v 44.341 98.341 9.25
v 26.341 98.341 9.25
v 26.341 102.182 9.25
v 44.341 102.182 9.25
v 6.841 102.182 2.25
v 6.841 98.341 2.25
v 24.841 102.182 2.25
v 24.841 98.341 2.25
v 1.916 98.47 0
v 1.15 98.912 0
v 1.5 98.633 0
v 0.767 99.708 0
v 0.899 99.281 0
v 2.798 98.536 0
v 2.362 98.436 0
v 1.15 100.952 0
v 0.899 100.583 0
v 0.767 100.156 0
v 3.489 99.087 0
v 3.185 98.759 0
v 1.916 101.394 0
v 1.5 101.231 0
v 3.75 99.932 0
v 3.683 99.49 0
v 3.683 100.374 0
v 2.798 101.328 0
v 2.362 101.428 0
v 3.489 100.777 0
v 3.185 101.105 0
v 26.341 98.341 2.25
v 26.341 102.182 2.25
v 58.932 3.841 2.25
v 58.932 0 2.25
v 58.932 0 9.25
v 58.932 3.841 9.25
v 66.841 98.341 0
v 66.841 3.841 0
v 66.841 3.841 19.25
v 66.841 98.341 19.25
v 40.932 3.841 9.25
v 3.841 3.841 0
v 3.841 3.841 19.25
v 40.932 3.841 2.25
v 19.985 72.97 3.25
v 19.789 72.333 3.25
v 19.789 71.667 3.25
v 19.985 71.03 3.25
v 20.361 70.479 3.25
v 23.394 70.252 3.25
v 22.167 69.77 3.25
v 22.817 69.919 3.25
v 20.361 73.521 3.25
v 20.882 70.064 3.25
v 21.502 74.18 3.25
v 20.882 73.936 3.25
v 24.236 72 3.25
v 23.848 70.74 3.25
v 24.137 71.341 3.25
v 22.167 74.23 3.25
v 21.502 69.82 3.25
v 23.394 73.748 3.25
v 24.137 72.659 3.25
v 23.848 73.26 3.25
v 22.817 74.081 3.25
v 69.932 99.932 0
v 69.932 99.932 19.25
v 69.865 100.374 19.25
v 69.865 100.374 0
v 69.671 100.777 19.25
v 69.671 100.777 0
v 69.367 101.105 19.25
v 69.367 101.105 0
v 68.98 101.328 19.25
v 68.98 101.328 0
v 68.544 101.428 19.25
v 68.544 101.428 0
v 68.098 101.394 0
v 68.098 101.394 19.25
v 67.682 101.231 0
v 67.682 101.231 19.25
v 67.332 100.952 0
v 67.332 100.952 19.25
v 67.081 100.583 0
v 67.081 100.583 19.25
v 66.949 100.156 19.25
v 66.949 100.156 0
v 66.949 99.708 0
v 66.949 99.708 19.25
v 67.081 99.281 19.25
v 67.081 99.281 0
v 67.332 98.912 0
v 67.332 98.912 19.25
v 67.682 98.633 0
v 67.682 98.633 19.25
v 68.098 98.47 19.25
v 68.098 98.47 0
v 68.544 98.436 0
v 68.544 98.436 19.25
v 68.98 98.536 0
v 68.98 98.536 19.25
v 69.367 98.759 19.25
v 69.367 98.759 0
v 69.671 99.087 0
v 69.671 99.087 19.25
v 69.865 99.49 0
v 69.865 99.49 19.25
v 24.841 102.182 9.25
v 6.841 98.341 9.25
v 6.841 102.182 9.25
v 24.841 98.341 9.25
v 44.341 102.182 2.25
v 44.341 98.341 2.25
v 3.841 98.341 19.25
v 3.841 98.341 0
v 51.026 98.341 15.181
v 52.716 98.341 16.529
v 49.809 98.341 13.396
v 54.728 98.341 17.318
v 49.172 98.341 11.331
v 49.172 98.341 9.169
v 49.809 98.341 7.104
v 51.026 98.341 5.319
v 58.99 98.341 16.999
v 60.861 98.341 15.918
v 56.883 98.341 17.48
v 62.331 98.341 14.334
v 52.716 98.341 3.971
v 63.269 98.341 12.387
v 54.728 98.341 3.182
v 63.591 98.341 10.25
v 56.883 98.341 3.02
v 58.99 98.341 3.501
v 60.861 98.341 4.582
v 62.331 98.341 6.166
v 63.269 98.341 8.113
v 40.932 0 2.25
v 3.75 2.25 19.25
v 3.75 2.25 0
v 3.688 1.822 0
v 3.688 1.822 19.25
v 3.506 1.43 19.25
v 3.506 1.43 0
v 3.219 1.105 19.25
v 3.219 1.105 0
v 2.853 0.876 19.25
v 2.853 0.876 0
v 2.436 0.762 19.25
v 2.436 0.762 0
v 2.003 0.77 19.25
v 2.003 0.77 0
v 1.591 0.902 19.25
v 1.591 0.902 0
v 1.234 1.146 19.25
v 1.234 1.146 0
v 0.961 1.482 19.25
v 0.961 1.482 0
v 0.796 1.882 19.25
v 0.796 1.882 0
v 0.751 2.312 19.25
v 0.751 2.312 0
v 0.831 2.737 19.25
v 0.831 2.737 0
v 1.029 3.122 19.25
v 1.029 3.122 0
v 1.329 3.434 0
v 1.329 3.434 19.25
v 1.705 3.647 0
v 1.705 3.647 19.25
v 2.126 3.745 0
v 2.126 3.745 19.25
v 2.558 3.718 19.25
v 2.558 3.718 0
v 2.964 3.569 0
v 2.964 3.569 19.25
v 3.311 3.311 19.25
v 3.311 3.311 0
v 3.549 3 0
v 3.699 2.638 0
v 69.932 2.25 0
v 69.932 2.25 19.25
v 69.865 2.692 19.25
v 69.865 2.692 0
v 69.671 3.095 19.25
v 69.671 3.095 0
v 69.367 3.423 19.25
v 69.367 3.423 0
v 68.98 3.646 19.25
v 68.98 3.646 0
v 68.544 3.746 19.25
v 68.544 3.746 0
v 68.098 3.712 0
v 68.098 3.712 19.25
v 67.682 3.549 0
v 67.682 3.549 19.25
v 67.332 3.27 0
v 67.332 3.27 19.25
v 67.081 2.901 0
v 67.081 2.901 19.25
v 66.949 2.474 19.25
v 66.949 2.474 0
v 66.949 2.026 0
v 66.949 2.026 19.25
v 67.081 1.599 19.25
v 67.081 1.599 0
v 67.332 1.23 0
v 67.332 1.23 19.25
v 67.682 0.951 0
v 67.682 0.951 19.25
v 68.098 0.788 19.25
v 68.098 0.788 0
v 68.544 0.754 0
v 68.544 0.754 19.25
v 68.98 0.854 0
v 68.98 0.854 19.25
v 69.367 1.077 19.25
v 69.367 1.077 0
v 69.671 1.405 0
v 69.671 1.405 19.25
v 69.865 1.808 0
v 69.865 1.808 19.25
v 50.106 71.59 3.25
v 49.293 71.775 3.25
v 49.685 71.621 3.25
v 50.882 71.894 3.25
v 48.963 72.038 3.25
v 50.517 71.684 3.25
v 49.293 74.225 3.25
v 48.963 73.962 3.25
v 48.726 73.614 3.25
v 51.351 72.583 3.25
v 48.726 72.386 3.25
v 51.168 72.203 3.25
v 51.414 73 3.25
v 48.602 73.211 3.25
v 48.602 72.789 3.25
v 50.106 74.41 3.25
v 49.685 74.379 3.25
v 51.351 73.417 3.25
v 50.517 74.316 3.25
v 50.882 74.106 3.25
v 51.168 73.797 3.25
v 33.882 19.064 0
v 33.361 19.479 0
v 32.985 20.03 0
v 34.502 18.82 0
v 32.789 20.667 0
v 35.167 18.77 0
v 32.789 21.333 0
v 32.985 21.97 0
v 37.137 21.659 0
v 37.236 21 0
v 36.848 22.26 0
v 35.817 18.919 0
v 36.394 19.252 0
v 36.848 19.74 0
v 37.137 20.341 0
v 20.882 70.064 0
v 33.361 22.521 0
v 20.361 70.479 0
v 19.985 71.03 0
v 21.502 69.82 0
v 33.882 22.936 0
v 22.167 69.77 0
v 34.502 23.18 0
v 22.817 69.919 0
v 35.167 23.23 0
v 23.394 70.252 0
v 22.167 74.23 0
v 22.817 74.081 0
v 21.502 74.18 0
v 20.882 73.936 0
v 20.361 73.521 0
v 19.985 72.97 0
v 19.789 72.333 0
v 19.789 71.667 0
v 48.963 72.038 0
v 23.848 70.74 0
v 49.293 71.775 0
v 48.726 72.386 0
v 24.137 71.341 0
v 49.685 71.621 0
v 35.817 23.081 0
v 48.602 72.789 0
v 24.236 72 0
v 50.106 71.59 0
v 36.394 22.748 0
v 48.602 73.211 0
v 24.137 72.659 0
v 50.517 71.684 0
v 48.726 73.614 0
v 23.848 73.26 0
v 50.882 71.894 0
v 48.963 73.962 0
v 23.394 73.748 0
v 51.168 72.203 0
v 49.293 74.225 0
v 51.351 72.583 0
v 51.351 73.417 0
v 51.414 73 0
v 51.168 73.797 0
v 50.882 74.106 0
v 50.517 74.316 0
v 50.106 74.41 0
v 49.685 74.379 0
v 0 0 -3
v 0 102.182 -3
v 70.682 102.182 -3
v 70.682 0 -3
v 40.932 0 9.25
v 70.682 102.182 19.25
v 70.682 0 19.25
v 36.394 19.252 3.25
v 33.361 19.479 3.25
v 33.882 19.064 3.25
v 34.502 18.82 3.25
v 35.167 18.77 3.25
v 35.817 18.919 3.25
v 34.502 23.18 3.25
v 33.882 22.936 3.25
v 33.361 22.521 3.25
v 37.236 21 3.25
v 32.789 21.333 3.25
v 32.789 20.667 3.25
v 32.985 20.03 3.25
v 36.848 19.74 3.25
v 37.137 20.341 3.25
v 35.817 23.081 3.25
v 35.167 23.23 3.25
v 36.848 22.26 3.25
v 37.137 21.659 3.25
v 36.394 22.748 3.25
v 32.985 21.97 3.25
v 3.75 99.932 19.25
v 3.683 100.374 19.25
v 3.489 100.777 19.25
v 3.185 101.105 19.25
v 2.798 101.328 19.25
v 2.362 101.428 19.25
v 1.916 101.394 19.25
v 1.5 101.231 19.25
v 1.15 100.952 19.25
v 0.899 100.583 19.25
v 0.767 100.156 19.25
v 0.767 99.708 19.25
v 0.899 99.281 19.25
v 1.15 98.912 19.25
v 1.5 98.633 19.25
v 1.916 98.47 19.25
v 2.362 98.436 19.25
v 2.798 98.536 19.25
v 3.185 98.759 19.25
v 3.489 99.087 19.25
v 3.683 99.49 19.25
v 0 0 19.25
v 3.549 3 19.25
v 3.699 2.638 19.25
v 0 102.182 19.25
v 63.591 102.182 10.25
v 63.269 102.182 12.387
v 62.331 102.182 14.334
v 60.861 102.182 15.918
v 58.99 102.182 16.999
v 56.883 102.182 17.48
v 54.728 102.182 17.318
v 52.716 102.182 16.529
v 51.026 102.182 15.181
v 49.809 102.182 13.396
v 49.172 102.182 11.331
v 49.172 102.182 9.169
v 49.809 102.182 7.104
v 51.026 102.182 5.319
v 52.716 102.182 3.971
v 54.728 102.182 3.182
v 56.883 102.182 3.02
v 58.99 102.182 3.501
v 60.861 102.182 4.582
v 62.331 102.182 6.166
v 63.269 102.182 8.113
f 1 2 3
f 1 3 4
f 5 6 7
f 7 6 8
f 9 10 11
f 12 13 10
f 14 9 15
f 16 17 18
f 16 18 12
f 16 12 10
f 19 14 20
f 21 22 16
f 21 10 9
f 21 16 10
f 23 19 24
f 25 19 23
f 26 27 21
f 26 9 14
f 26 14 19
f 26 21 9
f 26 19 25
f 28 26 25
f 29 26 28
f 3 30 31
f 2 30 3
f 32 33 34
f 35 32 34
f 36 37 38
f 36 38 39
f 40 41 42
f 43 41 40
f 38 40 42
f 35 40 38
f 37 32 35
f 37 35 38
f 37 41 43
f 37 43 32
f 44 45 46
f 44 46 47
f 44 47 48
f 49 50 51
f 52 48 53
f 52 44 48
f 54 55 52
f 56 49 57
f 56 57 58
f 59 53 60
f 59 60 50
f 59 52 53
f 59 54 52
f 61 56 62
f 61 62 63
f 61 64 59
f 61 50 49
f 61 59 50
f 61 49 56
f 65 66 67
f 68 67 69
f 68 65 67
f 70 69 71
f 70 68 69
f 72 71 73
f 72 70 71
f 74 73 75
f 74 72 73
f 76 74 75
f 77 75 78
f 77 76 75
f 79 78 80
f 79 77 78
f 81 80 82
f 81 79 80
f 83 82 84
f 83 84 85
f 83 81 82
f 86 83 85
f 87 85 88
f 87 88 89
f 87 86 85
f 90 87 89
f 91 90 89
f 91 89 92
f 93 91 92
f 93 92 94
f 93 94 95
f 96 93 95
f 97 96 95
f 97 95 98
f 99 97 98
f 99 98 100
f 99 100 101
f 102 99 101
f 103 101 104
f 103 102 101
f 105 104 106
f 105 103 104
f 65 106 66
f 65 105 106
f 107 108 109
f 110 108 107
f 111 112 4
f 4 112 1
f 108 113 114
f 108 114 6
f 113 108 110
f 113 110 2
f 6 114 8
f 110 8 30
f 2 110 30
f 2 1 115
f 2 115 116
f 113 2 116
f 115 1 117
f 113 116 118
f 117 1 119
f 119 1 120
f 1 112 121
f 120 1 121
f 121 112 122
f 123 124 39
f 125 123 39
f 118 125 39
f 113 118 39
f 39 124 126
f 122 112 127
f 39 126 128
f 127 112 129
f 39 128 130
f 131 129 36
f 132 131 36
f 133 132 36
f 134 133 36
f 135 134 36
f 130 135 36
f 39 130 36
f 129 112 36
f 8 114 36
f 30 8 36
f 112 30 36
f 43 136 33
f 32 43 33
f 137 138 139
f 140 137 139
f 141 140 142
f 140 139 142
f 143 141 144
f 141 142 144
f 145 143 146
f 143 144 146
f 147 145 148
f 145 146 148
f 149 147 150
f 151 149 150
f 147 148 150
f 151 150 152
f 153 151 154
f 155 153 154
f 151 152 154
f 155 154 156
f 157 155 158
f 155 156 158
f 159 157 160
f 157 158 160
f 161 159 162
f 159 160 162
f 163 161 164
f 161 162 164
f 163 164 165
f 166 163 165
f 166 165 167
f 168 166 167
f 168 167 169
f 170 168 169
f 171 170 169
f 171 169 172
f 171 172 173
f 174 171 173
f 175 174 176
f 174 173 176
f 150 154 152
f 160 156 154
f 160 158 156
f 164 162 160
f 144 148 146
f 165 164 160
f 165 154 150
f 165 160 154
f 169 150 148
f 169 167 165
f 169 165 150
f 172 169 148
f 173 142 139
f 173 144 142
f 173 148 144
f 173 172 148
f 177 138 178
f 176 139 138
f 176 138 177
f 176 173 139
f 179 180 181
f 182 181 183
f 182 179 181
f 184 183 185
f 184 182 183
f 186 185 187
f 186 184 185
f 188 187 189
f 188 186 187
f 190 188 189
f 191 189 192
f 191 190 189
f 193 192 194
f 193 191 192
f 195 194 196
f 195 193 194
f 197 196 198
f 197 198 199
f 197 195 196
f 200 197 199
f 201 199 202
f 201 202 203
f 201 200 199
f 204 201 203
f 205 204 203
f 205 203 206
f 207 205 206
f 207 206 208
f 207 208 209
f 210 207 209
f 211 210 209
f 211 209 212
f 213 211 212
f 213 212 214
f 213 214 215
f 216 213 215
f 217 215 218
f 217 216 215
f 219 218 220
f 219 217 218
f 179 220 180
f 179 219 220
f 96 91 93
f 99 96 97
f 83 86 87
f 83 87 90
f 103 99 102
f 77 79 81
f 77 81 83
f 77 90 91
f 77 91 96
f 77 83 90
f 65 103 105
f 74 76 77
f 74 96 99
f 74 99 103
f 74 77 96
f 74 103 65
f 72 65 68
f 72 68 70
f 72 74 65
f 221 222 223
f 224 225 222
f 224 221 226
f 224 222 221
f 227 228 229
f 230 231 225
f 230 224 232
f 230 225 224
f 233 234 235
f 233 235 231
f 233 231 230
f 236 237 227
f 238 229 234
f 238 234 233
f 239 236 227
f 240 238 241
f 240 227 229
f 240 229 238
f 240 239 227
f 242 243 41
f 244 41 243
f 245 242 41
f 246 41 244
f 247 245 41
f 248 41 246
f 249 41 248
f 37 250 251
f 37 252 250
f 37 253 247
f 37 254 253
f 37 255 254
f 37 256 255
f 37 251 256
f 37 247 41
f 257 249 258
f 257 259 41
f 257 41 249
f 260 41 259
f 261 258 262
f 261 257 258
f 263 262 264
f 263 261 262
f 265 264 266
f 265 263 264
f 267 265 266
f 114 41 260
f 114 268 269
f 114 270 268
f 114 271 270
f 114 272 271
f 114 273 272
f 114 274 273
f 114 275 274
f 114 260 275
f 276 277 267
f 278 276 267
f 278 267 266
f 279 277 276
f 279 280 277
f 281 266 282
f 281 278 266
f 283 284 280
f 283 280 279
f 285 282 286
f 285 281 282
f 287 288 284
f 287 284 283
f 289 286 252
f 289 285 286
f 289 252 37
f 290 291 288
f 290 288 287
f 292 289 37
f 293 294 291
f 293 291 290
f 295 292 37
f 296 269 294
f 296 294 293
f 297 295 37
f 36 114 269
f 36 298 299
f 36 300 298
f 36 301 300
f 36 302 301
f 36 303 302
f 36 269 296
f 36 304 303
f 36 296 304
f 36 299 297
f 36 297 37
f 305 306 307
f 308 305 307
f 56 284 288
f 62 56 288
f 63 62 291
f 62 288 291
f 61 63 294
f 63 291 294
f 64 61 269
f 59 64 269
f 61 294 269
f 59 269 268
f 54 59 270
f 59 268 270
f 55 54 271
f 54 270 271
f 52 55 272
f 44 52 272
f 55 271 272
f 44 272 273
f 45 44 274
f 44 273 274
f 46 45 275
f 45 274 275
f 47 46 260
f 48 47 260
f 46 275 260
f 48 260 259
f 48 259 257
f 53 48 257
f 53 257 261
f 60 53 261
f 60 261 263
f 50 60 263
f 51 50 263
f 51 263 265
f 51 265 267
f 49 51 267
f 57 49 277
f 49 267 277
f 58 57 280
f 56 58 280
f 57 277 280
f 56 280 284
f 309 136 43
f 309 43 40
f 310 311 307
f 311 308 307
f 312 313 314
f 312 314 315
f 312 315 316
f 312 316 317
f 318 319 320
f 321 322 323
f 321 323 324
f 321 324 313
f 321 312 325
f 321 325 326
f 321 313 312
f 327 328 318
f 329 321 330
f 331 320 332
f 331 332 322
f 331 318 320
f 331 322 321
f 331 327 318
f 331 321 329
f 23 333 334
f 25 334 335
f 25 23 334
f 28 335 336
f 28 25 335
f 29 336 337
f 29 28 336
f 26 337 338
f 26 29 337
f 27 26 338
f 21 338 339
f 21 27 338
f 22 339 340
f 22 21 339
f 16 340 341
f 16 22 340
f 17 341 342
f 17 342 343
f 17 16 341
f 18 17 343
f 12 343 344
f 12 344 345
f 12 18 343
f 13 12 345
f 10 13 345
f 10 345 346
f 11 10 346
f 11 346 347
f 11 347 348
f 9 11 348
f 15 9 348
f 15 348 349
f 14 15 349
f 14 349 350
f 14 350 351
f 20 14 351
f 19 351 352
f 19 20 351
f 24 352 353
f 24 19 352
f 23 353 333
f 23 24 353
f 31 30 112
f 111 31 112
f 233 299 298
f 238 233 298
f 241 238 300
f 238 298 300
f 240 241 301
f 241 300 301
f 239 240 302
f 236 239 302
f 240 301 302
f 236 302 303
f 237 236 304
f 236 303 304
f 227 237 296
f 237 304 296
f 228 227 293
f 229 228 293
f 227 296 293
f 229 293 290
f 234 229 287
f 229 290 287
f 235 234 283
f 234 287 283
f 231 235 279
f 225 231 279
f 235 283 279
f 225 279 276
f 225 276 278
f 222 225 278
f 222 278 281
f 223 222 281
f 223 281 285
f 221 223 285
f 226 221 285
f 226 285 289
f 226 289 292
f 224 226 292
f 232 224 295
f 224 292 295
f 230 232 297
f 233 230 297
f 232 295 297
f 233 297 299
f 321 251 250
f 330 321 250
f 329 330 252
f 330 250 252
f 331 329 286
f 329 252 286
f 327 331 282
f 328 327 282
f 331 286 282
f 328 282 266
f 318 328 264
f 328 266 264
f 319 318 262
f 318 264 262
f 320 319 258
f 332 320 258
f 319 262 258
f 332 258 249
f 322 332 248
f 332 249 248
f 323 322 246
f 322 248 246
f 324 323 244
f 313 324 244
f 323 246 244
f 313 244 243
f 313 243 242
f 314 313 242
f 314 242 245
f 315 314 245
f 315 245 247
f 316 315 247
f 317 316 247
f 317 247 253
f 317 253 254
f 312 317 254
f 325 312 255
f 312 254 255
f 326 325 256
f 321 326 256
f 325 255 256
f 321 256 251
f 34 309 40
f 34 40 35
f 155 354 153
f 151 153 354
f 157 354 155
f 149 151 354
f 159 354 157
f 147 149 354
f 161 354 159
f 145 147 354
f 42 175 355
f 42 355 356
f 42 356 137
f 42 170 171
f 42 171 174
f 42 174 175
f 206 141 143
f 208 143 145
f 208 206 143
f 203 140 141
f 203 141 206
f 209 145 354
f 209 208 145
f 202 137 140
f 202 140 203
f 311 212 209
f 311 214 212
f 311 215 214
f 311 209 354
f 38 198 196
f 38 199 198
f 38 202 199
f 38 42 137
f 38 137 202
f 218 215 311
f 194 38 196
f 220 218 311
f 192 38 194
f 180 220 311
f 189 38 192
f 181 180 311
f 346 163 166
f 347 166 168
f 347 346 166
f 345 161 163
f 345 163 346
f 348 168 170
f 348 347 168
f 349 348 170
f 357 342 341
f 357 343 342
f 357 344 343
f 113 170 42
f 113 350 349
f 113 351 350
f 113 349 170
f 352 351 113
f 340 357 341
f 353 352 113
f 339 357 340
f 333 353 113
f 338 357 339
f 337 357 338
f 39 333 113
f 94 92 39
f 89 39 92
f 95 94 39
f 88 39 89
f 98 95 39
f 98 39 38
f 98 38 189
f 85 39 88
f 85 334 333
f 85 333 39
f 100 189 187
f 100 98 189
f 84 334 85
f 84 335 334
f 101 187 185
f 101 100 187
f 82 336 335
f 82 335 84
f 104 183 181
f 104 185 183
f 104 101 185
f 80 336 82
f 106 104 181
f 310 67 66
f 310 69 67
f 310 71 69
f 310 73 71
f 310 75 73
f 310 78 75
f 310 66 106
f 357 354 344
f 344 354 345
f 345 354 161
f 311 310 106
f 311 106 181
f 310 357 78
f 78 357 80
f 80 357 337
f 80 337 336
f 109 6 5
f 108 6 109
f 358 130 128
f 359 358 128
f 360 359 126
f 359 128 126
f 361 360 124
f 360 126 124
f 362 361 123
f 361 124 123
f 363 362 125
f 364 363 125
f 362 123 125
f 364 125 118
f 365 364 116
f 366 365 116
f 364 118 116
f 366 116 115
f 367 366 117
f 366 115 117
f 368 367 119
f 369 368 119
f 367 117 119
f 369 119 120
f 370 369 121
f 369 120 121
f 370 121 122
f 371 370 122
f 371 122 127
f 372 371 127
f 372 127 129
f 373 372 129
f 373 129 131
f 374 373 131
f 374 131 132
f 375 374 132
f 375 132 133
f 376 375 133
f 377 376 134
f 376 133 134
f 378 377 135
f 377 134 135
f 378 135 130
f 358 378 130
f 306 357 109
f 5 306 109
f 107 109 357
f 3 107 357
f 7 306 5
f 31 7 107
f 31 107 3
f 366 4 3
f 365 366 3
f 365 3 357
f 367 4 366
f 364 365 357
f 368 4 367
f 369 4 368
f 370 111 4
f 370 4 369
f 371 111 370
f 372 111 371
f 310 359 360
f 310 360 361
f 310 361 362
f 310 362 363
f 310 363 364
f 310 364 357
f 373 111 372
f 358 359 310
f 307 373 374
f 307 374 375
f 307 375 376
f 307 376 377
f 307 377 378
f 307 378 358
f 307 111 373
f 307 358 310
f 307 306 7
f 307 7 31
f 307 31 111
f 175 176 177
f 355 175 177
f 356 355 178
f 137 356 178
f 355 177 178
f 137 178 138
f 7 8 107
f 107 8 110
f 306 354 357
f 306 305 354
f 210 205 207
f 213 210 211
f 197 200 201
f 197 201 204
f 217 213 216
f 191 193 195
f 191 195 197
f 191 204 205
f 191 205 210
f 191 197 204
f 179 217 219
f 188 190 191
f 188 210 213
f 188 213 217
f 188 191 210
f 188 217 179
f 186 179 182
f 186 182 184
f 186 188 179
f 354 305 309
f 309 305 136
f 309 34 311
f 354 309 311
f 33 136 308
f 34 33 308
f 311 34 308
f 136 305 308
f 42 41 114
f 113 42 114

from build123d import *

# Parameters (mm, degrees)
SKETCH1_R             = 2.236067977
BOSS_EXTRUDE1_DEPTH   = 3.25
SKETCH1_R_2           = 1.414213562
BOSS_EXTRUDE1_2_DEPTH = 3.25
BOSS_EXTRUDE1_3_DEPTH = 3.25
SKETCH1_21_W          = 70.681980515
SKETCH1_21_H          = 102.181980515
BOSS_EXTRUDE2_DEPTH   = 3
SKETCH1_23_W          = 70.681980515
SKETCH1_23_H          = 102.181980515
SKETCH1_23_R          = 1.5
SKETCH1_23_W_2        = 63
SKETCH1_23_H_2        = 94.5
BOSS_EXTRUDE4_DEPTH   = 19.25
SKETCH3_R             = 7.25
SKETCH3_W             = 18
SKETCH3_H             = 7
CUT_EXTRUDE1_DEPTH    = 3.84099
SKETCH4_W             = 18
SKETCH4_H             = 7
CUT_EXTRUDE2_DEPTH    = 3.84099


with BuildPart() as part:
    # Sketch1 → Boss-Extrude1 (new body)
    with BuildSketch(Plane.XY):
        with Locations((22, 72)):
            Circle(SKETCH1_R)
    extrude(amount=BOSS_EXTRUDE1_DEPTH)



with BuildPart() as body_2:
    # Sketch1 → Boss-Extrude1 2 (new body)
    with BuildSketch(Plane.XY):
        with Locations((50, 73)):
            Circle(SKETCH1_R_2)
    extrude(amount=BOSS_EXTRUDE1_2_DEPTH)


with BuildPart() as body_3:
    # Sketch1 → Boss-Extrude1 3 (new body)
    with BuildSketch(Plane.XY):
        with Locations((35, 21)):
            Circle(SKETCH1_R)
    extrude(amount=BOSS_EXTRUDE1_3_DEPTH)


with BuildPart() as part_1:
    add(part.part)

    add(body_2.part)  # Boss-Extrude2 merges body 2

    add(body_3.part)  # Boss-Extrude2 merges body 3
    # Sketch1<21> → Boss-Extrude2 (add)
    with BuildSketch(Plane.XY):
        with Locations((35.340990258, 51.090990258)):
            Rectangle(SKETCH1_21_W, SKETCH1_21_H)
    extrude(amount=-BOSS_EXTRUDE2_DEPTH)

    # Sketch1<23> → Boss-Extrude4 (add)
    with BuildSketch(Plane.XY):
        with Locations((35.340990258, 51.090990258)):
            Rectangle(SKETCH1_23_W, SKETCH1_23_H)
        with BuildLine():
            ThreePointArc((3.75, 2.25), (0.864180701, 1.675974851), (3.310660172, 3.310660172))
            ThreePointArc((3.310660172, 3.310660172), (3.635819299, 2.824025149), (3.75, 2.25))
        make_face(mode=Mode.SUBTRACT)
        with Locations((68.431980515, 2.25)):
            Circle(SKETCH1_23_R, mode=Mode.SUBTRACT)
        with Locations((2.25, 99.931980515)):
            Circle(SKETCH1_23_R, mode=Mode.SUBTRACT)
        with Locations((35.340990258, 51.090990258)):
            Rectangle(SKETCH1_23_W_2, SKETCH1_23_H_2, mode=Mode.SUBTRACT)
        with Locations((68.431980515, 99.931980515)):
            Circle(SKETCH1_23_R, mode=Mode.SUBTRACT)
    extrude(amount=BOSS_EXTRUDE4_DEPTH)

    # Sketch3 → Cut-Extrude1 (cut)
    with BuildSketch(Plane.XZ.offset(-98.340990258)):
        with Locations((56.340990258, 10.25)):
            Circle(SKETCH3_R)
        with Locations((15.840990258, 5.75)):
            Rectangle(SKETCH3_W, SKETCH3_H)
        with Locations((35.340990258, 5.75)):
            Rectangle(SKETCH3_W, SKETCH3_H)
    extrude(amount=-CUT_EXTRUDE1_DEPTH, mode=Mode.SUBTRACT)

    # Sketch4 → Cut-Extrude2 (cut)
    with BuildSketch(Plane.XZ):
        with Locations((49.931980515, 5.75)):
            Rectangle(SKETCH4_W, SKETCH4_H)
    extrude(amount=-CUT_EXTRUDE2_DEPTH, mode=Mode.SUBTRACT)


solid = part_1.part
